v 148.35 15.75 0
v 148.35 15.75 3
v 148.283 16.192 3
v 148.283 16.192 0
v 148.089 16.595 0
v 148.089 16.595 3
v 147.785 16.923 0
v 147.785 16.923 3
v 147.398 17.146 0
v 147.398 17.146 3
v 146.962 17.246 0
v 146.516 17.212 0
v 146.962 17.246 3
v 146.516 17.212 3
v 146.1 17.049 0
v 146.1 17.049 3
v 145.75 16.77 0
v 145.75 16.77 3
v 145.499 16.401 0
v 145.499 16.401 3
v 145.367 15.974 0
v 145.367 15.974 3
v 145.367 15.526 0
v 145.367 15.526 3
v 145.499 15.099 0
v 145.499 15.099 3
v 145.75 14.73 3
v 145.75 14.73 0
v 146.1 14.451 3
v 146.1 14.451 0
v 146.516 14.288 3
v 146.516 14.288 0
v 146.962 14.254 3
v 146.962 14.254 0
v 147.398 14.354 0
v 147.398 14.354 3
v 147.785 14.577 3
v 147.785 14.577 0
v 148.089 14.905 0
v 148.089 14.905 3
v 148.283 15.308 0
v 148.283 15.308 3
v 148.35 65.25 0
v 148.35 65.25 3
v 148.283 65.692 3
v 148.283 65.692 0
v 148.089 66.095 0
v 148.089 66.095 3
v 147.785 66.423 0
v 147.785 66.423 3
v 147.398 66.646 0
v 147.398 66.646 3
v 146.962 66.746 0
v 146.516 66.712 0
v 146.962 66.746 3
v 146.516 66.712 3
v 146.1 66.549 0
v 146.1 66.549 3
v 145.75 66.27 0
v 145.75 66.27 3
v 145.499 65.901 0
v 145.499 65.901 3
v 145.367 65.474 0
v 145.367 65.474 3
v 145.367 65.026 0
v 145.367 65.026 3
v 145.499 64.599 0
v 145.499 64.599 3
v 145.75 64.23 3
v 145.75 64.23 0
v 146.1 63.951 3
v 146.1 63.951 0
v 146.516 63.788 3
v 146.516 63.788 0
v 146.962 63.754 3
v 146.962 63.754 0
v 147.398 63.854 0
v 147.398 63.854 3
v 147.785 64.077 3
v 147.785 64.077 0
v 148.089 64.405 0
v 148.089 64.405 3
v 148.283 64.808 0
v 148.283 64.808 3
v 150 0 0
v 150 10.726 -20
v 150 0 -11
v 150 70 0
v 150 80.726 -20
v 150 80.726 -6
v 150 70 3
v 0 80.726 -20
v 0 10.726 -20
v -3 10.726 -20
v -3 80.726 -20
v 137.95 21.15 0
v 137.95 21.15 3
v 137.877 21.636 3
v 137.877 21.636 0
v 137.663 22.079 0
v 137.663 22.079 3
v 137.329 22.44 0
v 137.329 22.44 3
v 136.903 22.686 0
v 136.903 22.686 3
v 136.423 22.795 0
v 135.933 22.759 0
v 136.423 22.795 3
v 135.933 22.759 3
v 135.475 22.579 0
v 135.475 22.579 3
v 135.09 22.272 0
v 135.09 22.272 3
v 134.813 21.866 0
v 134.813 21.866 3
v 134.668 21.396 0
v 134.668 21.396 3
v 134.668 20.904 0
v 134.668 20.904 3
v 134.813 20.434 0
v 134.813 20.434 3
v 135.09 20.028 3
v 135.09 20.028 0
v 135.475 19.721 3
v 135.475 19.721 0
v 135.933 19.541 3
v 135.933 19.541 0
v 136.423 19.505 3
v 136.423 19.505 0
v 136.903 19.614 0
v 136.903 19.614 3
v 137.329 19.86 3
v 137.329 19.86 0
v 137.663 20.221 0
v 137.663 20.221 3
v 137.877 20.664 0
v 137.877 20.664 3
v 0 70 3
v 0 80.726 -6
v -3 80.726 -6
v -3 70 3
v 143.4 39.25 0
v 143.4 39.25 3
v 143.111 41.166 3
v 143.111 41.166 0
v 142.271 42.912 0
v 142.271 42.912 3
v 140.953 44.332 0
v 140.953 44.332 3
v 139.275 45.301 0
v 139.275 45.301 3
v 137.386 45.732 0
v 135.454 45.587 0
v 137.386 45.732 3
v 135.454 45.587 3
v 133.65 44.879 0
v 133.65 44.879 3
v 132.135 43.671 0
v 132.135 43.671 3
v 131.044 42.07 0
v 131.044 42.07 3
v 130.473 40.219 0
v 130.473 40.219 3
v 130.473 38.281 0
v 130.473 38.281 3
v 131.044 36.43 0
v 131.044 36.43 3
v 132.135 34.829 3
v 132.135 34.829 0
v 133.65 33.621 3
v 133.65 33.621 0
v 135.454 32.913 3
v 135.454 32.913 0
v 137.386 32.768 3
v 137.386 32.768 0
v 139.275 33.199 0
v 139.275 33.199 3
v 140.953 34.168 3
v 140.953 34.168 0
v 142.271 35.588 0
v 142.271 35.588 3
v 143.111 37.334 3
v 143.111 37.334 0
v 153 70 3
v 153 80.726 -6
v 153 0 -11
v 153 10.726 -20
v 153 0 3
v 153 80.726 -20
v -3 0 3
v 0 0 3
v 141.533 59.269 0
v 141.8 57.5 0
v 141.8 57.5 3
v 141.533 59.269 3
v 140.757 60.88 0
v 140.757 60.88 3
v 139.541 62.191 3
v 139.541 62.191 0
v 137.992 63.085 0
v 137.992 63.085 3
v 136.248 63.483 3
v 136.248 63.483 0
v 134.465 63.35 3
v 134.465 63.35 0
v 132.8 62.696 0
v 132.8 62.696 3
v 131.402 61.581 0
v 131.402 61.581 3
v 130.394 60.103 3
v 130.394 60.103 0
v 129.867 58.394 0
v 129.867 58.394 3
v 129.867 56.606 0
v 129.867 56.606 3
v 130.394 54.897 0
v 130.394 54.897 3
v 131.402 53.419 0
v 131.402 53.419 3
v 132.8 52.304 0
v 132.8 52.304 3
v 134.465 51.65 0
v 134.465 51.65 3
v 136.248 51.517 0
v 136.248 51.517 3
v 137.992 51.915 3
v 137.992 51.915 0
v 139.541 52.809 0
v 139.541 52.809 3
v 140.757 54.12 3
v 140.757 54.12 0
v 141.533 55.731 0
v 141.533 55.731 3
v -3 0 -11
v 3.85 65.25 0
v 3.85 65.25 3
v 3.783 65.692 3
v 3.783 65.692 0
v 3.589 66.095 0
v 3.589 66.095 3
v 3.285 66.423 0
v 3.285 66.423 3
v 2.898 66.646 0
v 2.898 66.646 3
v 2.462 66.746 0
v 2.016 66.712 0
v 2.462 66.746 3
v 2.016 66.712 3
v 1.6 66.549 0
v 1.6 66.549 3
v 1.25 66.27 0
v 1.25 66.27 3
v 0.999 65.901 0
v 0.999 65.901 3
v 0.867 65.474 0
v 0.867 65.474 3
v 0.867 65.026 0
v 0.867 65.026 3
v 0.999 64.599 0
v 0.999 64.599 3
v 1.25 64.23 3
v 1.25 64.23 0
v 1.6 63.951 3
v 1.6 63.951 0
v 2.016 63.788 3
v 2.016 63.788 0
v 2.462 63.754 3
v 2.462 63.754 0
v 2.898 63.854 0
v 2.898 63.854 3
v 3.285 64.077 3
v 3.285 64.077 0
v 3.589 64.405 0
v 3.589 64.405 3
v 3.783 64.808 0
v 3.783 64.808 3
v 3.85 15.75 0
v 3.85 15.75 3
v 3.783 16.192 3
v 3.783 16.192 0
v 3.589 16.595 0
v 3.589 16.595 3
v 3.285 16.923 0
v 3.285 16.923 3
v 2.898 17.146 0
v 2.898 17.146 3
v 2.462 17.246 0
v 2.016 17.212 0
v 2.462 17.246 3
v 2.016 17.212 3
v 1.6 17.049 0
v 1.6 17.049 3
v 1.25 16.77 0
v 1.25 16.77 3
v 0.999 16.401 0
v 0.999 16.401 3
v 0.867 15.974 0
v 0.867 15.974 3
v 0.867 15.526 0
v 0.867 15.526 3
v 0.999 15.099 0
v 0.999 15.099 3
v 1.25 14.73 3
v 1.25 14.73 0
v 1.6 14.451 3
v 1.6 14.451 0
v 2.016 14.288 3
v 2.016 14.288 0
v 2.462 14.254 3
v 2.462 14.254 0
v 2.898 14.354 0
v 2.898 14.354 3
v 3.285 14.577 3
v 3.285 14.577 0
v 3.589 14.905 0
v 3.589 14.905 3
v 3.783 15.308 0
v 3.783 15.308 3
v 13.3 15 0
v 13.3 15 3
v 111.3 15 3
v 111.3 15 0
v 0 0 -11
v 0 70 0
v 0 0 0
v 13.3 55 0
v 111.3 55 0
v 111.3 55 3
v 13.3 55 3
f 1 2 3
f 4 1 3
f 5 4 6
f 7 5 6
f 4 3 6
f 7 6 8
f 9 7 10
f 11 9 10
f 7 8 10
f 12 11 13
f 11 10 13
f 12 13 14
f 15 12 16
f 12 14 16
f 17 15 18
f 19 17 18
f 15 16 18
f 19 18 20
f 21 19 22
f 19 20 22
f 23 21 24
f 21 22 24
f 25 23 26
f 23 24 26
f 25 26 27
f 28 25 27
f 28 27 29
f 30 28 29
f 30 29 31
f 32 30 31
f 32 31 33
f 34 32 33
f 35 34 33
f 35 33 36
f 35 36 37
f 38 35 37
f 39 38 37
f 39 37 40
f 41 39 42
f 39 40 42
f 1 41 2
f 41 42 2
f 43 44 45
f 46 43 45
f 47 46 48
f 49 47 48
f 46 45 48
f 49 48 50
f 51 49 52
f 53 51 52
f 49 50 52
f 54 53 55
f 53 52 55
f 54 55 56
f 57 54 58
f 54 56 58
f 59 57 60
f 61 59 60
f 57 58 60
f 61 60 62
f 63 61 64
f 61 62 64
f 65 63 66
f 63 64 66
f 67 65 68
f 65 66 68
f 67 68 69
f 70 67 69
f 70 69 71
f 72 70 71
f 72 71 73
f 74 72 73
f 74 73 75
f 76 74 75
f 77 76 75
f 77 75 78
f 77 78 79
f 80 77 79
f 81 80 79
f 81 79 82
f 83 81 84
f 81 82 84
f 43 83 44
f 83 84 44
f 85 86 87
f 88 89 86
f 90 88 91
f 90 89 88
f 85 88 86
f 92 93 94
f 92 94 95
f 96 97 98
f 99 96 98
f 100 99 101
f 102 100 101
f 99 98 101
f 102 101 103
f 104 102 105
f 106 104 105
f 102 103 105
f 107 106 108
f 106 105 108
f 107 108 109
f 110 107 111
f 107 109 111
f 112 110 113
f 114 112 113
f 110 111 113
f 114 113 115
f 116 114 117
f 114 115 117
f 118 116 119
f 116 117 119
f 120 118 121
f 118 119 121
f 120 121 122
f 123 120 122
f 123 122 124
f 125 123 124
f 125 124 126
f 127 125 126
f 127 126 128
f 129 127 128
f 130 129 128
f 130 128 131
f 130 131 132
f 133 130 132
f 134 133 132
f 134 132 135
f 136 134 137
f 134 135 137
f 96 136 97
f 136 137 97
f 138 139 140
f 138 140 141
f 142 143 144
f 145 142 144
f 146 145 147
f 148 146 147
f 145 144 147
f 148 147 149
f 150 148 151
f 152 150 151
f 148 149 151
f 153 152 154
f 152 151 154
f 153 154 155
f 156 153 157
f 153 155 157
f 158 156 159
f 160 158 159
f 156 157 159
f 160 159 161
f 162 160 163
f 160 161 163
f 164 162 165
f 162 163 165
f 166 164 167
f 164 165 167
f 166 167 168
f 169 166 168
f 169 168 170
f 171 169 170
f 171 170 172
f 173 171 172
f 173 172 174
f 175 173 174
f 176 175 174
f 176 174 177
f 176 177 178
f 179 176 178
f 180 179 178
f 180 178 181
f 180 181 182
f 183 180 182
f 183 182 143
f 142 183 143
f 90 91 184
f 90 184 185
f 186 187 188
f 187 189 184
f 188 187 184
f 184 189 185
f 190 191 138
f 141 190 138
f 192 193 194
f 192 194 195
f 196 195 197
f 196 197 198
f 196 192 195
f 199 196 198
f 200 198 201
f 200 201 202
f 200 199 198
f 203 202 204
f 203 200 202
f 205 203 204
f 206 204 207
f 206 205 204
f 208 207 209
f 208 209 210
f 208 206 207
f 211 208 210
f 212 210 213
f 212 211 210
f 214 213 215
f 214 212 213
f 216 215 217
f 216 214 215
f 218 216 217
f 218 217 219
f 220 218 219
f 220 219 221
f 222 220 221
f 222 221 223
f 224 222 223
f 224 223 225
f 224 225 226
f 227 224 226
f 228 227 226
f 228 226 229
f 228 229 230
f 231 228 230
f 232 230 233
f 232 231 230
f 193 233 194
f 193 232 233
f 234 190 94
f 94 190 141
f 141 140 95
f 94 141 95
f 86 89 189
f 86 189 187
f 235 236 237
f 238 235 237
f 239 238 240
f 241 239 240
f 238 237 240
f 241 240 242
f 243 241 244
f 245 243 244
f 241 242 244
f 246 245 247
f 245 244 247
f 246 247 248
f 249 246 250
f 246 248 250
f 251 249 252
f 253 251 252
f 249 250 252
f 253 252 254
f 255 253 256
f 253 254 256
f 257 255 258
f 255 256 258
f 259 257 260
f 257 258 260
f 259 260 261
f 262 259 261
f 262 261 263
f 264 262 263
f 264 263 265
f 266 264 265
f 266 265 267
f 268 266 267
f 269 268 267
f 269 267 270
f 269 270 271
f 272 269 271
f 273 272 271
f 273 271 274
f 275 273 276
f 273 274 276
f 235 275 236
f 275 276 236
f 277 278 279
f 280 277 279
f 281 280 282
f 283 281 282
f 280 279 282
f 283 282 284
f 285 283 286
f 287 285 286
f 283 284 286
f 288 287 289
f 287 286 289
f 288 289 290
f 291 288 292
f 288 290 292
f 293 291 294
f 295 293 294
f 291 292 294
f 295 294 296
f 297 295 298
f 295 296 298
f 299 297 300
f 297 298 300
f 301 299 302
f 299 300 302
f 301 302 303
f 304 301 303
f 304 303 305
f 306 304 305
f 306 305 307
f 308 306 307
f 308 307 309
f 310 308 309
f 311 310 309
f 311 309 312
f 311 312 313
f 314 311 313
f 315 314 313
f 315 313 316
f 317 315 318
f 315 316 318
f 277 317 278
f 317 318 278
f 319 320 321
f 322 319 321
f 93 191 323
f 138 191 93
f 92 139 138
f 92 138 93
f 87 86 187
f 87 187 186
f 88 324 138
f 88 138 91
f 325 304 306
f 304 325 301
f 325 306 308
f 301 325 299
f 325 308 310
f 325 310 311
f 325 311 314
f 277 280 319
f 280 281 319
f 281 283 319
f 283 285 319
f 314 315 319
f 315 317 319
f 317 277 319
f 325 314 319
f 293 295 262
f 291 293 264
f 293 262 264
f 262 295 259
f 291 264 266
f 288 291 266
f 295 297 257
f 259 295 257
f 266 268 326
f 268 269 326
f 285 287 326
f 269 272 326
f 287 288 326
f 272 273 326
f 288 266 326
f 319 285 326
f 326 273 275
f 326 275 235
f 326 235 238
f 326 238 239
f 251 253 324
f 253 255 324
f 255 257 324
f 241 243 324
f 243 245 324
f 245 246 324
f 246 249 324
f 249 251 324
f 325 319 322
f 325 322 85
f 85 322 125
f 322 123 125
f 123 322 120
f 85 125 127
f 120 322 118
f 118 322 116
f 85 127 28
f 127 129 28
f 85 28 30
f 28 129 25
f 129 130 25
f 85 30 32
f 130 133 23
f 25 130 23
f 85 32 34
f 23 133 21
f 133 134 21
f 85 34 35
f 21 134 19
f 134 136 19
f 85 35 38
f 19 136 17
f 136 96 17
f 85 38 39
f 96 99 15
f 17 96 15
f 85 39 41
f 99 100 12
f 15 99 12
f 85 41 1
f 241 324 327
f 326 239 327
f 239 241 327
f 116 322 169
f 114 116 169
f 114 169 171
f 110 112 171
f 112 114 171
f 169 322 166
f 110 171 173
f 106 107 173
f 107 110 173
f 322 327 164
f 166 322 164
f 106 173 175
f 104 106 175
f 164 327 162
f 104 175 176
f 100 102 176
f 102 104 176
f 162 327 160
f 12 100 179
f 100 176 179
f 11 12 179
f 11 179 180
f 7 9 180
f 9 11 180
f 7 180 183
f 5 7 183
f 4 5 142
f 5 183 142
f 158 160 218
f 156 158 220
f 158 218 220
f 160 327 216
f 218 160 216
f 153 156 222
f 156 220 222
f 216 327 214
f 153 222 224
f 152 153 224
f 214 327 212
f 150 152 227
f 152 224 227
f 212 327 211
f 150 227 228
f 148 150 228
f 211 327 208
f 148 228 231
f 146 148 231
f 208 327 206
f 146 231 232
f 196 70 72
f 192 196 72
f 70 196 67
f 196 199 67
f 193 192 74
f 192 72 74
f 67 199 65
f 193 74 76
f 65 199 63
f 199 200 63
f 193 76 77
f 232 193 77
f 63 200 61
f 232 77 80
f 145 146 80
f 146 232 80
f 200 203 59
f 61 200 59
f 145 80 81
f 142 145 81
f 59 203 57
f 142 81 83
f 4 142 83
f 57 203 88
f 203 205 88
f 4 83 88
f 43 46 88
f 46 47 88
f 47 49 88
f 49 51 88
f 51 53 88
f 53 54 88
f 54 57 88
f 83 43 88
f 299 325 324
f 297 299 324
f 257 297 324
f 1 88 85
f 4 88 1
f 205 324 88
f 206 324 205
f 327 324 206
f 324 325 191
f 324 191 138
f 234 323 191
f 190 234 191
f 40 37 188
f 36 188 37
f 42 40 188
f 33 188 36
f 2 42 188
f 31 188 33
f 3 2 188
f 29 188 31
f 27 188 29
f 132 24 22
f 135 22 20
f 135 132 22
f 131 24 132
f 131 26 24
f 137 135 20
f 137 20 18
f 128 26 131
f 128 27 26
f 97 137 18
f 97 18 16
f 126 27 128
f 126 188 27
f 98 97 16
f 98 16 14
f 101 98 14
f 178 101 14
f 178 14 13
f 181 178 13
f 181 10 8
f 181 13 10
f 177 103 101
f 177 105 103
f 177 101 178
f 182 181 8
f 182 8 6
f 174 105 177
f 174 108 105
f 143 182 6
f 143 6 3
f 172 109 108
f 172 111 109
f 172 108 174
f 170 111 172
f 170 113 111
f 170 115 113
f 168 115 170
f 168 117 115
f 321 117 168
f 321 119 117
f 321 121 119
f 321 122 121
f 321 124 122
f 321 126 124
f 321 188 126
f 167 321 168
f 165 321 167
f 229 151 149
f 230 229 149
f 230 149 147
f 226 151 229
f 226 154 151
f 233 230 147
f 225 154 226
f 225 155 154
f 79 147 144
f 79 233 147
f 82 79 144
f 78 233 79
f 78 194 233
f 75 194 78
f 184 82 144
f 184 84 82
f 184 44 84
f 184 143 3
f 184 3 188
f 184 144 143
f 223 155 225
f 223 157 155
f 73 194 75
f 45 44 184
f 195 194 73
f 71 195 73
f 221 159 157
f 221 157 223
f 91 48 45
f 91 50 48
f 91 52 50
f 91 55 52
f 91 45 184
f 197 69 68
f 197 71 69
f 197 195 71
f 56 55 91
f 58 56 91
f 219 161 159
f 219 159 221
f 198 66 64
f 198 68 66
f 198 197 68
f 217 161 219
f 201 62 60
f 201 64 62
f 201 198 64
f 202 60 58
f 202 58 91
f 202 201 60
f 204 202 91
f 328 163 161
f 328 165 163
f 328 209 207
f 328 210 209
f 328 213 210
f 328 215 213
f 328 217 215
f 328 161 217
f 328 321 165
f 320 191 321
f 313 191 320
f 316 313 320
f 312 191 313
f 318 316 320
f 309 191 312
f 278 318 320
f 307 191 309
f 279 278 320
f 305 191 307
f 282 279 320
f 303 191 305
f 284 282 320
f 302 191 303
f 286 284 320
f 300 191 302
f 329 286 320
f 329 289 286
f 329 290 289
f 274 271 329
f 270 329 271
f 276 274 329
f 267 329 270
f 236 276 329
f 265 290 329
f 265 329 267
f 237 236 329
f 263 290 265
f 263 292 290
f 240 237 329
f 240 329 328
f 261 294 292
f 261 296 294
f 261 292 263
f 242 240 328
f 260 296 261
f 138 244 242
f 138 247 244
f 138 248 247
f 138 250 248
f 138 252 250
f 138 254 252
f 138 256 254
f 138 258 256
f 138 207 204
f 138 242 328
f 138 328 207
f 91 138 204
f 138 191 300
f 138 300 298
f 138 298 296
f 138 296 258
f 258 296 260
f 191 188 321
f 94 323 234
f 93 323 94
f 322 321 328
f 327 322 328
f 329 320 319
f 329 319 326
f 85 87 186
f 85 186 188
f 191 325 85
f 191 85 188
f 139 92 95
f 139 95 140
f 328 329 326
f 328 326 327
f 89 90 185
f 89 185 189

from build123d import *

# Parameters (mm, degrees)
CROQUIS1_W              = 150
CROQUIS1_H              = 70
CROQUIS1_R              = 6
SALIENTE_EXTRUIR1_DEPTH = 3
CROQUIS2_W              = 98
CROQUIS2_H              = 40
CORTAR_EXTRUIR1_DEPTH   = 3
CROQUIS3_R              = 6.5
CORTAR_EXTRUIR2_DEPTH   = 4
CROQUIS4_R              = 1.65
CORTAR_EXTRUIR3_DEPTH   = 3
CROQUIS5_R              = 1.5
CORTAR_EXTRUIR4_DEPTH   = 3
SALIENTE_EXTRUIR4_DEPTH = 3
CROQUIS9_W              = 3
CROQUIS9_H              = 70
SALIENTE_EXTRUIR5_DEPTH = 3


with BuildPart() as part:
    # Croquis1 → Saliente-Extruir1 (new body)
    with BuildSketch(Plane.XY):
        with Locations((75, 35)):
            Rectangle(CROQUIS1_W, CROQUIS1_H)
        with Locations((135.8, 57.5)):
            Circle(CROQUIS1_R, mode=Mode.SUBTRACT)
    extrude(amount=SALIENTE_EXTRUIR1_DEPTH)

    # Croquis2 → Cortar-Extruir1 (cut)
    with BuildSketch(Plane.XY.offset(3)):
        with Locations((62.3, 35)):
            Rectangle(CROQUIS2_W, CROQUIS2_H)
    extrude(amount=-CORTAR_EXTRUIR1_DEPTH, mode=Mode.SUBTRACT)

    # Croquis3 → Cortar-Extruir2 (cut, through all)
    with BuildSketch(Plane.XY.offset(3)):
        with Locations((136.9, 39.25)):
            Circle(CROQUIS3_R)
    extrude(amount=-CORTAR_EXTRUIR2_DEPTH, mode=Mode.SUBTRACT)

    # Croquis4 → Cortar-Extruir3 (cut)
    with BuildSketch(Plane.XY.offset(3)):
        with Locations((136.3, 21.15)):
            Circle(CROQUIS4_R)
    extrude(amount=-CORTAR_EXTRUIR3_DEPTH, mode=Mode.SUBTRACT)

    # Croquis5 → Cortar-Extruir4 (cut)
    with BuildSketch(Plane.XY.offset(3)):
        with Locations((146.85, 65.25)):
            Circle(CROQUIS5_R)
        with Locations((146.85, 15.75)):
            Circle(CROQUIS5_R)
        with Locations((2.35, 15.75)):
            Circle(CROQUIS5_R)
        with Locations((2.35, 65.25)):
            Circle(CROQUIS5_R)
    extrude(amount=-CORTAR_EXTRUIR4_DEPTH, mode=Mode.SUBTRACT)

    # Croquis7 → Saliente-Extruir4 (add)
    with BuildSketch(Plane(origin=(150, 0, 0), x_dir=(0, 0, -1), z_dir=(1, 0, 0))):
        Polygon((-3, 70), (6, 80.725782333), (20, 80.725782333), (20, 10.725782333), (11, 0), (-3, 0), align=None)
    extrude(amount=SALIENTE_EXTRUIR4_DEPTH)


with BuildPart() as body_2:
    # Croquis9 → Saliente-Extruir5 (new body)
    with BuildSketch(Plane.ZY):
        Polygon((-20, 80.725782333), (-6, 80.725782333), (3, 70), (0, 70), (0, 0), (-11, 0), (-20, 10.725782333), align=None)
        with Locations((1.5, 35)):
            Rectangle(CROQUIS9_W, CROQUIS9_H)
    extrude(amount=SALIENTE_EXTRUIR5_DEPTH)


solid = Compound([part.part, body_2.part])
